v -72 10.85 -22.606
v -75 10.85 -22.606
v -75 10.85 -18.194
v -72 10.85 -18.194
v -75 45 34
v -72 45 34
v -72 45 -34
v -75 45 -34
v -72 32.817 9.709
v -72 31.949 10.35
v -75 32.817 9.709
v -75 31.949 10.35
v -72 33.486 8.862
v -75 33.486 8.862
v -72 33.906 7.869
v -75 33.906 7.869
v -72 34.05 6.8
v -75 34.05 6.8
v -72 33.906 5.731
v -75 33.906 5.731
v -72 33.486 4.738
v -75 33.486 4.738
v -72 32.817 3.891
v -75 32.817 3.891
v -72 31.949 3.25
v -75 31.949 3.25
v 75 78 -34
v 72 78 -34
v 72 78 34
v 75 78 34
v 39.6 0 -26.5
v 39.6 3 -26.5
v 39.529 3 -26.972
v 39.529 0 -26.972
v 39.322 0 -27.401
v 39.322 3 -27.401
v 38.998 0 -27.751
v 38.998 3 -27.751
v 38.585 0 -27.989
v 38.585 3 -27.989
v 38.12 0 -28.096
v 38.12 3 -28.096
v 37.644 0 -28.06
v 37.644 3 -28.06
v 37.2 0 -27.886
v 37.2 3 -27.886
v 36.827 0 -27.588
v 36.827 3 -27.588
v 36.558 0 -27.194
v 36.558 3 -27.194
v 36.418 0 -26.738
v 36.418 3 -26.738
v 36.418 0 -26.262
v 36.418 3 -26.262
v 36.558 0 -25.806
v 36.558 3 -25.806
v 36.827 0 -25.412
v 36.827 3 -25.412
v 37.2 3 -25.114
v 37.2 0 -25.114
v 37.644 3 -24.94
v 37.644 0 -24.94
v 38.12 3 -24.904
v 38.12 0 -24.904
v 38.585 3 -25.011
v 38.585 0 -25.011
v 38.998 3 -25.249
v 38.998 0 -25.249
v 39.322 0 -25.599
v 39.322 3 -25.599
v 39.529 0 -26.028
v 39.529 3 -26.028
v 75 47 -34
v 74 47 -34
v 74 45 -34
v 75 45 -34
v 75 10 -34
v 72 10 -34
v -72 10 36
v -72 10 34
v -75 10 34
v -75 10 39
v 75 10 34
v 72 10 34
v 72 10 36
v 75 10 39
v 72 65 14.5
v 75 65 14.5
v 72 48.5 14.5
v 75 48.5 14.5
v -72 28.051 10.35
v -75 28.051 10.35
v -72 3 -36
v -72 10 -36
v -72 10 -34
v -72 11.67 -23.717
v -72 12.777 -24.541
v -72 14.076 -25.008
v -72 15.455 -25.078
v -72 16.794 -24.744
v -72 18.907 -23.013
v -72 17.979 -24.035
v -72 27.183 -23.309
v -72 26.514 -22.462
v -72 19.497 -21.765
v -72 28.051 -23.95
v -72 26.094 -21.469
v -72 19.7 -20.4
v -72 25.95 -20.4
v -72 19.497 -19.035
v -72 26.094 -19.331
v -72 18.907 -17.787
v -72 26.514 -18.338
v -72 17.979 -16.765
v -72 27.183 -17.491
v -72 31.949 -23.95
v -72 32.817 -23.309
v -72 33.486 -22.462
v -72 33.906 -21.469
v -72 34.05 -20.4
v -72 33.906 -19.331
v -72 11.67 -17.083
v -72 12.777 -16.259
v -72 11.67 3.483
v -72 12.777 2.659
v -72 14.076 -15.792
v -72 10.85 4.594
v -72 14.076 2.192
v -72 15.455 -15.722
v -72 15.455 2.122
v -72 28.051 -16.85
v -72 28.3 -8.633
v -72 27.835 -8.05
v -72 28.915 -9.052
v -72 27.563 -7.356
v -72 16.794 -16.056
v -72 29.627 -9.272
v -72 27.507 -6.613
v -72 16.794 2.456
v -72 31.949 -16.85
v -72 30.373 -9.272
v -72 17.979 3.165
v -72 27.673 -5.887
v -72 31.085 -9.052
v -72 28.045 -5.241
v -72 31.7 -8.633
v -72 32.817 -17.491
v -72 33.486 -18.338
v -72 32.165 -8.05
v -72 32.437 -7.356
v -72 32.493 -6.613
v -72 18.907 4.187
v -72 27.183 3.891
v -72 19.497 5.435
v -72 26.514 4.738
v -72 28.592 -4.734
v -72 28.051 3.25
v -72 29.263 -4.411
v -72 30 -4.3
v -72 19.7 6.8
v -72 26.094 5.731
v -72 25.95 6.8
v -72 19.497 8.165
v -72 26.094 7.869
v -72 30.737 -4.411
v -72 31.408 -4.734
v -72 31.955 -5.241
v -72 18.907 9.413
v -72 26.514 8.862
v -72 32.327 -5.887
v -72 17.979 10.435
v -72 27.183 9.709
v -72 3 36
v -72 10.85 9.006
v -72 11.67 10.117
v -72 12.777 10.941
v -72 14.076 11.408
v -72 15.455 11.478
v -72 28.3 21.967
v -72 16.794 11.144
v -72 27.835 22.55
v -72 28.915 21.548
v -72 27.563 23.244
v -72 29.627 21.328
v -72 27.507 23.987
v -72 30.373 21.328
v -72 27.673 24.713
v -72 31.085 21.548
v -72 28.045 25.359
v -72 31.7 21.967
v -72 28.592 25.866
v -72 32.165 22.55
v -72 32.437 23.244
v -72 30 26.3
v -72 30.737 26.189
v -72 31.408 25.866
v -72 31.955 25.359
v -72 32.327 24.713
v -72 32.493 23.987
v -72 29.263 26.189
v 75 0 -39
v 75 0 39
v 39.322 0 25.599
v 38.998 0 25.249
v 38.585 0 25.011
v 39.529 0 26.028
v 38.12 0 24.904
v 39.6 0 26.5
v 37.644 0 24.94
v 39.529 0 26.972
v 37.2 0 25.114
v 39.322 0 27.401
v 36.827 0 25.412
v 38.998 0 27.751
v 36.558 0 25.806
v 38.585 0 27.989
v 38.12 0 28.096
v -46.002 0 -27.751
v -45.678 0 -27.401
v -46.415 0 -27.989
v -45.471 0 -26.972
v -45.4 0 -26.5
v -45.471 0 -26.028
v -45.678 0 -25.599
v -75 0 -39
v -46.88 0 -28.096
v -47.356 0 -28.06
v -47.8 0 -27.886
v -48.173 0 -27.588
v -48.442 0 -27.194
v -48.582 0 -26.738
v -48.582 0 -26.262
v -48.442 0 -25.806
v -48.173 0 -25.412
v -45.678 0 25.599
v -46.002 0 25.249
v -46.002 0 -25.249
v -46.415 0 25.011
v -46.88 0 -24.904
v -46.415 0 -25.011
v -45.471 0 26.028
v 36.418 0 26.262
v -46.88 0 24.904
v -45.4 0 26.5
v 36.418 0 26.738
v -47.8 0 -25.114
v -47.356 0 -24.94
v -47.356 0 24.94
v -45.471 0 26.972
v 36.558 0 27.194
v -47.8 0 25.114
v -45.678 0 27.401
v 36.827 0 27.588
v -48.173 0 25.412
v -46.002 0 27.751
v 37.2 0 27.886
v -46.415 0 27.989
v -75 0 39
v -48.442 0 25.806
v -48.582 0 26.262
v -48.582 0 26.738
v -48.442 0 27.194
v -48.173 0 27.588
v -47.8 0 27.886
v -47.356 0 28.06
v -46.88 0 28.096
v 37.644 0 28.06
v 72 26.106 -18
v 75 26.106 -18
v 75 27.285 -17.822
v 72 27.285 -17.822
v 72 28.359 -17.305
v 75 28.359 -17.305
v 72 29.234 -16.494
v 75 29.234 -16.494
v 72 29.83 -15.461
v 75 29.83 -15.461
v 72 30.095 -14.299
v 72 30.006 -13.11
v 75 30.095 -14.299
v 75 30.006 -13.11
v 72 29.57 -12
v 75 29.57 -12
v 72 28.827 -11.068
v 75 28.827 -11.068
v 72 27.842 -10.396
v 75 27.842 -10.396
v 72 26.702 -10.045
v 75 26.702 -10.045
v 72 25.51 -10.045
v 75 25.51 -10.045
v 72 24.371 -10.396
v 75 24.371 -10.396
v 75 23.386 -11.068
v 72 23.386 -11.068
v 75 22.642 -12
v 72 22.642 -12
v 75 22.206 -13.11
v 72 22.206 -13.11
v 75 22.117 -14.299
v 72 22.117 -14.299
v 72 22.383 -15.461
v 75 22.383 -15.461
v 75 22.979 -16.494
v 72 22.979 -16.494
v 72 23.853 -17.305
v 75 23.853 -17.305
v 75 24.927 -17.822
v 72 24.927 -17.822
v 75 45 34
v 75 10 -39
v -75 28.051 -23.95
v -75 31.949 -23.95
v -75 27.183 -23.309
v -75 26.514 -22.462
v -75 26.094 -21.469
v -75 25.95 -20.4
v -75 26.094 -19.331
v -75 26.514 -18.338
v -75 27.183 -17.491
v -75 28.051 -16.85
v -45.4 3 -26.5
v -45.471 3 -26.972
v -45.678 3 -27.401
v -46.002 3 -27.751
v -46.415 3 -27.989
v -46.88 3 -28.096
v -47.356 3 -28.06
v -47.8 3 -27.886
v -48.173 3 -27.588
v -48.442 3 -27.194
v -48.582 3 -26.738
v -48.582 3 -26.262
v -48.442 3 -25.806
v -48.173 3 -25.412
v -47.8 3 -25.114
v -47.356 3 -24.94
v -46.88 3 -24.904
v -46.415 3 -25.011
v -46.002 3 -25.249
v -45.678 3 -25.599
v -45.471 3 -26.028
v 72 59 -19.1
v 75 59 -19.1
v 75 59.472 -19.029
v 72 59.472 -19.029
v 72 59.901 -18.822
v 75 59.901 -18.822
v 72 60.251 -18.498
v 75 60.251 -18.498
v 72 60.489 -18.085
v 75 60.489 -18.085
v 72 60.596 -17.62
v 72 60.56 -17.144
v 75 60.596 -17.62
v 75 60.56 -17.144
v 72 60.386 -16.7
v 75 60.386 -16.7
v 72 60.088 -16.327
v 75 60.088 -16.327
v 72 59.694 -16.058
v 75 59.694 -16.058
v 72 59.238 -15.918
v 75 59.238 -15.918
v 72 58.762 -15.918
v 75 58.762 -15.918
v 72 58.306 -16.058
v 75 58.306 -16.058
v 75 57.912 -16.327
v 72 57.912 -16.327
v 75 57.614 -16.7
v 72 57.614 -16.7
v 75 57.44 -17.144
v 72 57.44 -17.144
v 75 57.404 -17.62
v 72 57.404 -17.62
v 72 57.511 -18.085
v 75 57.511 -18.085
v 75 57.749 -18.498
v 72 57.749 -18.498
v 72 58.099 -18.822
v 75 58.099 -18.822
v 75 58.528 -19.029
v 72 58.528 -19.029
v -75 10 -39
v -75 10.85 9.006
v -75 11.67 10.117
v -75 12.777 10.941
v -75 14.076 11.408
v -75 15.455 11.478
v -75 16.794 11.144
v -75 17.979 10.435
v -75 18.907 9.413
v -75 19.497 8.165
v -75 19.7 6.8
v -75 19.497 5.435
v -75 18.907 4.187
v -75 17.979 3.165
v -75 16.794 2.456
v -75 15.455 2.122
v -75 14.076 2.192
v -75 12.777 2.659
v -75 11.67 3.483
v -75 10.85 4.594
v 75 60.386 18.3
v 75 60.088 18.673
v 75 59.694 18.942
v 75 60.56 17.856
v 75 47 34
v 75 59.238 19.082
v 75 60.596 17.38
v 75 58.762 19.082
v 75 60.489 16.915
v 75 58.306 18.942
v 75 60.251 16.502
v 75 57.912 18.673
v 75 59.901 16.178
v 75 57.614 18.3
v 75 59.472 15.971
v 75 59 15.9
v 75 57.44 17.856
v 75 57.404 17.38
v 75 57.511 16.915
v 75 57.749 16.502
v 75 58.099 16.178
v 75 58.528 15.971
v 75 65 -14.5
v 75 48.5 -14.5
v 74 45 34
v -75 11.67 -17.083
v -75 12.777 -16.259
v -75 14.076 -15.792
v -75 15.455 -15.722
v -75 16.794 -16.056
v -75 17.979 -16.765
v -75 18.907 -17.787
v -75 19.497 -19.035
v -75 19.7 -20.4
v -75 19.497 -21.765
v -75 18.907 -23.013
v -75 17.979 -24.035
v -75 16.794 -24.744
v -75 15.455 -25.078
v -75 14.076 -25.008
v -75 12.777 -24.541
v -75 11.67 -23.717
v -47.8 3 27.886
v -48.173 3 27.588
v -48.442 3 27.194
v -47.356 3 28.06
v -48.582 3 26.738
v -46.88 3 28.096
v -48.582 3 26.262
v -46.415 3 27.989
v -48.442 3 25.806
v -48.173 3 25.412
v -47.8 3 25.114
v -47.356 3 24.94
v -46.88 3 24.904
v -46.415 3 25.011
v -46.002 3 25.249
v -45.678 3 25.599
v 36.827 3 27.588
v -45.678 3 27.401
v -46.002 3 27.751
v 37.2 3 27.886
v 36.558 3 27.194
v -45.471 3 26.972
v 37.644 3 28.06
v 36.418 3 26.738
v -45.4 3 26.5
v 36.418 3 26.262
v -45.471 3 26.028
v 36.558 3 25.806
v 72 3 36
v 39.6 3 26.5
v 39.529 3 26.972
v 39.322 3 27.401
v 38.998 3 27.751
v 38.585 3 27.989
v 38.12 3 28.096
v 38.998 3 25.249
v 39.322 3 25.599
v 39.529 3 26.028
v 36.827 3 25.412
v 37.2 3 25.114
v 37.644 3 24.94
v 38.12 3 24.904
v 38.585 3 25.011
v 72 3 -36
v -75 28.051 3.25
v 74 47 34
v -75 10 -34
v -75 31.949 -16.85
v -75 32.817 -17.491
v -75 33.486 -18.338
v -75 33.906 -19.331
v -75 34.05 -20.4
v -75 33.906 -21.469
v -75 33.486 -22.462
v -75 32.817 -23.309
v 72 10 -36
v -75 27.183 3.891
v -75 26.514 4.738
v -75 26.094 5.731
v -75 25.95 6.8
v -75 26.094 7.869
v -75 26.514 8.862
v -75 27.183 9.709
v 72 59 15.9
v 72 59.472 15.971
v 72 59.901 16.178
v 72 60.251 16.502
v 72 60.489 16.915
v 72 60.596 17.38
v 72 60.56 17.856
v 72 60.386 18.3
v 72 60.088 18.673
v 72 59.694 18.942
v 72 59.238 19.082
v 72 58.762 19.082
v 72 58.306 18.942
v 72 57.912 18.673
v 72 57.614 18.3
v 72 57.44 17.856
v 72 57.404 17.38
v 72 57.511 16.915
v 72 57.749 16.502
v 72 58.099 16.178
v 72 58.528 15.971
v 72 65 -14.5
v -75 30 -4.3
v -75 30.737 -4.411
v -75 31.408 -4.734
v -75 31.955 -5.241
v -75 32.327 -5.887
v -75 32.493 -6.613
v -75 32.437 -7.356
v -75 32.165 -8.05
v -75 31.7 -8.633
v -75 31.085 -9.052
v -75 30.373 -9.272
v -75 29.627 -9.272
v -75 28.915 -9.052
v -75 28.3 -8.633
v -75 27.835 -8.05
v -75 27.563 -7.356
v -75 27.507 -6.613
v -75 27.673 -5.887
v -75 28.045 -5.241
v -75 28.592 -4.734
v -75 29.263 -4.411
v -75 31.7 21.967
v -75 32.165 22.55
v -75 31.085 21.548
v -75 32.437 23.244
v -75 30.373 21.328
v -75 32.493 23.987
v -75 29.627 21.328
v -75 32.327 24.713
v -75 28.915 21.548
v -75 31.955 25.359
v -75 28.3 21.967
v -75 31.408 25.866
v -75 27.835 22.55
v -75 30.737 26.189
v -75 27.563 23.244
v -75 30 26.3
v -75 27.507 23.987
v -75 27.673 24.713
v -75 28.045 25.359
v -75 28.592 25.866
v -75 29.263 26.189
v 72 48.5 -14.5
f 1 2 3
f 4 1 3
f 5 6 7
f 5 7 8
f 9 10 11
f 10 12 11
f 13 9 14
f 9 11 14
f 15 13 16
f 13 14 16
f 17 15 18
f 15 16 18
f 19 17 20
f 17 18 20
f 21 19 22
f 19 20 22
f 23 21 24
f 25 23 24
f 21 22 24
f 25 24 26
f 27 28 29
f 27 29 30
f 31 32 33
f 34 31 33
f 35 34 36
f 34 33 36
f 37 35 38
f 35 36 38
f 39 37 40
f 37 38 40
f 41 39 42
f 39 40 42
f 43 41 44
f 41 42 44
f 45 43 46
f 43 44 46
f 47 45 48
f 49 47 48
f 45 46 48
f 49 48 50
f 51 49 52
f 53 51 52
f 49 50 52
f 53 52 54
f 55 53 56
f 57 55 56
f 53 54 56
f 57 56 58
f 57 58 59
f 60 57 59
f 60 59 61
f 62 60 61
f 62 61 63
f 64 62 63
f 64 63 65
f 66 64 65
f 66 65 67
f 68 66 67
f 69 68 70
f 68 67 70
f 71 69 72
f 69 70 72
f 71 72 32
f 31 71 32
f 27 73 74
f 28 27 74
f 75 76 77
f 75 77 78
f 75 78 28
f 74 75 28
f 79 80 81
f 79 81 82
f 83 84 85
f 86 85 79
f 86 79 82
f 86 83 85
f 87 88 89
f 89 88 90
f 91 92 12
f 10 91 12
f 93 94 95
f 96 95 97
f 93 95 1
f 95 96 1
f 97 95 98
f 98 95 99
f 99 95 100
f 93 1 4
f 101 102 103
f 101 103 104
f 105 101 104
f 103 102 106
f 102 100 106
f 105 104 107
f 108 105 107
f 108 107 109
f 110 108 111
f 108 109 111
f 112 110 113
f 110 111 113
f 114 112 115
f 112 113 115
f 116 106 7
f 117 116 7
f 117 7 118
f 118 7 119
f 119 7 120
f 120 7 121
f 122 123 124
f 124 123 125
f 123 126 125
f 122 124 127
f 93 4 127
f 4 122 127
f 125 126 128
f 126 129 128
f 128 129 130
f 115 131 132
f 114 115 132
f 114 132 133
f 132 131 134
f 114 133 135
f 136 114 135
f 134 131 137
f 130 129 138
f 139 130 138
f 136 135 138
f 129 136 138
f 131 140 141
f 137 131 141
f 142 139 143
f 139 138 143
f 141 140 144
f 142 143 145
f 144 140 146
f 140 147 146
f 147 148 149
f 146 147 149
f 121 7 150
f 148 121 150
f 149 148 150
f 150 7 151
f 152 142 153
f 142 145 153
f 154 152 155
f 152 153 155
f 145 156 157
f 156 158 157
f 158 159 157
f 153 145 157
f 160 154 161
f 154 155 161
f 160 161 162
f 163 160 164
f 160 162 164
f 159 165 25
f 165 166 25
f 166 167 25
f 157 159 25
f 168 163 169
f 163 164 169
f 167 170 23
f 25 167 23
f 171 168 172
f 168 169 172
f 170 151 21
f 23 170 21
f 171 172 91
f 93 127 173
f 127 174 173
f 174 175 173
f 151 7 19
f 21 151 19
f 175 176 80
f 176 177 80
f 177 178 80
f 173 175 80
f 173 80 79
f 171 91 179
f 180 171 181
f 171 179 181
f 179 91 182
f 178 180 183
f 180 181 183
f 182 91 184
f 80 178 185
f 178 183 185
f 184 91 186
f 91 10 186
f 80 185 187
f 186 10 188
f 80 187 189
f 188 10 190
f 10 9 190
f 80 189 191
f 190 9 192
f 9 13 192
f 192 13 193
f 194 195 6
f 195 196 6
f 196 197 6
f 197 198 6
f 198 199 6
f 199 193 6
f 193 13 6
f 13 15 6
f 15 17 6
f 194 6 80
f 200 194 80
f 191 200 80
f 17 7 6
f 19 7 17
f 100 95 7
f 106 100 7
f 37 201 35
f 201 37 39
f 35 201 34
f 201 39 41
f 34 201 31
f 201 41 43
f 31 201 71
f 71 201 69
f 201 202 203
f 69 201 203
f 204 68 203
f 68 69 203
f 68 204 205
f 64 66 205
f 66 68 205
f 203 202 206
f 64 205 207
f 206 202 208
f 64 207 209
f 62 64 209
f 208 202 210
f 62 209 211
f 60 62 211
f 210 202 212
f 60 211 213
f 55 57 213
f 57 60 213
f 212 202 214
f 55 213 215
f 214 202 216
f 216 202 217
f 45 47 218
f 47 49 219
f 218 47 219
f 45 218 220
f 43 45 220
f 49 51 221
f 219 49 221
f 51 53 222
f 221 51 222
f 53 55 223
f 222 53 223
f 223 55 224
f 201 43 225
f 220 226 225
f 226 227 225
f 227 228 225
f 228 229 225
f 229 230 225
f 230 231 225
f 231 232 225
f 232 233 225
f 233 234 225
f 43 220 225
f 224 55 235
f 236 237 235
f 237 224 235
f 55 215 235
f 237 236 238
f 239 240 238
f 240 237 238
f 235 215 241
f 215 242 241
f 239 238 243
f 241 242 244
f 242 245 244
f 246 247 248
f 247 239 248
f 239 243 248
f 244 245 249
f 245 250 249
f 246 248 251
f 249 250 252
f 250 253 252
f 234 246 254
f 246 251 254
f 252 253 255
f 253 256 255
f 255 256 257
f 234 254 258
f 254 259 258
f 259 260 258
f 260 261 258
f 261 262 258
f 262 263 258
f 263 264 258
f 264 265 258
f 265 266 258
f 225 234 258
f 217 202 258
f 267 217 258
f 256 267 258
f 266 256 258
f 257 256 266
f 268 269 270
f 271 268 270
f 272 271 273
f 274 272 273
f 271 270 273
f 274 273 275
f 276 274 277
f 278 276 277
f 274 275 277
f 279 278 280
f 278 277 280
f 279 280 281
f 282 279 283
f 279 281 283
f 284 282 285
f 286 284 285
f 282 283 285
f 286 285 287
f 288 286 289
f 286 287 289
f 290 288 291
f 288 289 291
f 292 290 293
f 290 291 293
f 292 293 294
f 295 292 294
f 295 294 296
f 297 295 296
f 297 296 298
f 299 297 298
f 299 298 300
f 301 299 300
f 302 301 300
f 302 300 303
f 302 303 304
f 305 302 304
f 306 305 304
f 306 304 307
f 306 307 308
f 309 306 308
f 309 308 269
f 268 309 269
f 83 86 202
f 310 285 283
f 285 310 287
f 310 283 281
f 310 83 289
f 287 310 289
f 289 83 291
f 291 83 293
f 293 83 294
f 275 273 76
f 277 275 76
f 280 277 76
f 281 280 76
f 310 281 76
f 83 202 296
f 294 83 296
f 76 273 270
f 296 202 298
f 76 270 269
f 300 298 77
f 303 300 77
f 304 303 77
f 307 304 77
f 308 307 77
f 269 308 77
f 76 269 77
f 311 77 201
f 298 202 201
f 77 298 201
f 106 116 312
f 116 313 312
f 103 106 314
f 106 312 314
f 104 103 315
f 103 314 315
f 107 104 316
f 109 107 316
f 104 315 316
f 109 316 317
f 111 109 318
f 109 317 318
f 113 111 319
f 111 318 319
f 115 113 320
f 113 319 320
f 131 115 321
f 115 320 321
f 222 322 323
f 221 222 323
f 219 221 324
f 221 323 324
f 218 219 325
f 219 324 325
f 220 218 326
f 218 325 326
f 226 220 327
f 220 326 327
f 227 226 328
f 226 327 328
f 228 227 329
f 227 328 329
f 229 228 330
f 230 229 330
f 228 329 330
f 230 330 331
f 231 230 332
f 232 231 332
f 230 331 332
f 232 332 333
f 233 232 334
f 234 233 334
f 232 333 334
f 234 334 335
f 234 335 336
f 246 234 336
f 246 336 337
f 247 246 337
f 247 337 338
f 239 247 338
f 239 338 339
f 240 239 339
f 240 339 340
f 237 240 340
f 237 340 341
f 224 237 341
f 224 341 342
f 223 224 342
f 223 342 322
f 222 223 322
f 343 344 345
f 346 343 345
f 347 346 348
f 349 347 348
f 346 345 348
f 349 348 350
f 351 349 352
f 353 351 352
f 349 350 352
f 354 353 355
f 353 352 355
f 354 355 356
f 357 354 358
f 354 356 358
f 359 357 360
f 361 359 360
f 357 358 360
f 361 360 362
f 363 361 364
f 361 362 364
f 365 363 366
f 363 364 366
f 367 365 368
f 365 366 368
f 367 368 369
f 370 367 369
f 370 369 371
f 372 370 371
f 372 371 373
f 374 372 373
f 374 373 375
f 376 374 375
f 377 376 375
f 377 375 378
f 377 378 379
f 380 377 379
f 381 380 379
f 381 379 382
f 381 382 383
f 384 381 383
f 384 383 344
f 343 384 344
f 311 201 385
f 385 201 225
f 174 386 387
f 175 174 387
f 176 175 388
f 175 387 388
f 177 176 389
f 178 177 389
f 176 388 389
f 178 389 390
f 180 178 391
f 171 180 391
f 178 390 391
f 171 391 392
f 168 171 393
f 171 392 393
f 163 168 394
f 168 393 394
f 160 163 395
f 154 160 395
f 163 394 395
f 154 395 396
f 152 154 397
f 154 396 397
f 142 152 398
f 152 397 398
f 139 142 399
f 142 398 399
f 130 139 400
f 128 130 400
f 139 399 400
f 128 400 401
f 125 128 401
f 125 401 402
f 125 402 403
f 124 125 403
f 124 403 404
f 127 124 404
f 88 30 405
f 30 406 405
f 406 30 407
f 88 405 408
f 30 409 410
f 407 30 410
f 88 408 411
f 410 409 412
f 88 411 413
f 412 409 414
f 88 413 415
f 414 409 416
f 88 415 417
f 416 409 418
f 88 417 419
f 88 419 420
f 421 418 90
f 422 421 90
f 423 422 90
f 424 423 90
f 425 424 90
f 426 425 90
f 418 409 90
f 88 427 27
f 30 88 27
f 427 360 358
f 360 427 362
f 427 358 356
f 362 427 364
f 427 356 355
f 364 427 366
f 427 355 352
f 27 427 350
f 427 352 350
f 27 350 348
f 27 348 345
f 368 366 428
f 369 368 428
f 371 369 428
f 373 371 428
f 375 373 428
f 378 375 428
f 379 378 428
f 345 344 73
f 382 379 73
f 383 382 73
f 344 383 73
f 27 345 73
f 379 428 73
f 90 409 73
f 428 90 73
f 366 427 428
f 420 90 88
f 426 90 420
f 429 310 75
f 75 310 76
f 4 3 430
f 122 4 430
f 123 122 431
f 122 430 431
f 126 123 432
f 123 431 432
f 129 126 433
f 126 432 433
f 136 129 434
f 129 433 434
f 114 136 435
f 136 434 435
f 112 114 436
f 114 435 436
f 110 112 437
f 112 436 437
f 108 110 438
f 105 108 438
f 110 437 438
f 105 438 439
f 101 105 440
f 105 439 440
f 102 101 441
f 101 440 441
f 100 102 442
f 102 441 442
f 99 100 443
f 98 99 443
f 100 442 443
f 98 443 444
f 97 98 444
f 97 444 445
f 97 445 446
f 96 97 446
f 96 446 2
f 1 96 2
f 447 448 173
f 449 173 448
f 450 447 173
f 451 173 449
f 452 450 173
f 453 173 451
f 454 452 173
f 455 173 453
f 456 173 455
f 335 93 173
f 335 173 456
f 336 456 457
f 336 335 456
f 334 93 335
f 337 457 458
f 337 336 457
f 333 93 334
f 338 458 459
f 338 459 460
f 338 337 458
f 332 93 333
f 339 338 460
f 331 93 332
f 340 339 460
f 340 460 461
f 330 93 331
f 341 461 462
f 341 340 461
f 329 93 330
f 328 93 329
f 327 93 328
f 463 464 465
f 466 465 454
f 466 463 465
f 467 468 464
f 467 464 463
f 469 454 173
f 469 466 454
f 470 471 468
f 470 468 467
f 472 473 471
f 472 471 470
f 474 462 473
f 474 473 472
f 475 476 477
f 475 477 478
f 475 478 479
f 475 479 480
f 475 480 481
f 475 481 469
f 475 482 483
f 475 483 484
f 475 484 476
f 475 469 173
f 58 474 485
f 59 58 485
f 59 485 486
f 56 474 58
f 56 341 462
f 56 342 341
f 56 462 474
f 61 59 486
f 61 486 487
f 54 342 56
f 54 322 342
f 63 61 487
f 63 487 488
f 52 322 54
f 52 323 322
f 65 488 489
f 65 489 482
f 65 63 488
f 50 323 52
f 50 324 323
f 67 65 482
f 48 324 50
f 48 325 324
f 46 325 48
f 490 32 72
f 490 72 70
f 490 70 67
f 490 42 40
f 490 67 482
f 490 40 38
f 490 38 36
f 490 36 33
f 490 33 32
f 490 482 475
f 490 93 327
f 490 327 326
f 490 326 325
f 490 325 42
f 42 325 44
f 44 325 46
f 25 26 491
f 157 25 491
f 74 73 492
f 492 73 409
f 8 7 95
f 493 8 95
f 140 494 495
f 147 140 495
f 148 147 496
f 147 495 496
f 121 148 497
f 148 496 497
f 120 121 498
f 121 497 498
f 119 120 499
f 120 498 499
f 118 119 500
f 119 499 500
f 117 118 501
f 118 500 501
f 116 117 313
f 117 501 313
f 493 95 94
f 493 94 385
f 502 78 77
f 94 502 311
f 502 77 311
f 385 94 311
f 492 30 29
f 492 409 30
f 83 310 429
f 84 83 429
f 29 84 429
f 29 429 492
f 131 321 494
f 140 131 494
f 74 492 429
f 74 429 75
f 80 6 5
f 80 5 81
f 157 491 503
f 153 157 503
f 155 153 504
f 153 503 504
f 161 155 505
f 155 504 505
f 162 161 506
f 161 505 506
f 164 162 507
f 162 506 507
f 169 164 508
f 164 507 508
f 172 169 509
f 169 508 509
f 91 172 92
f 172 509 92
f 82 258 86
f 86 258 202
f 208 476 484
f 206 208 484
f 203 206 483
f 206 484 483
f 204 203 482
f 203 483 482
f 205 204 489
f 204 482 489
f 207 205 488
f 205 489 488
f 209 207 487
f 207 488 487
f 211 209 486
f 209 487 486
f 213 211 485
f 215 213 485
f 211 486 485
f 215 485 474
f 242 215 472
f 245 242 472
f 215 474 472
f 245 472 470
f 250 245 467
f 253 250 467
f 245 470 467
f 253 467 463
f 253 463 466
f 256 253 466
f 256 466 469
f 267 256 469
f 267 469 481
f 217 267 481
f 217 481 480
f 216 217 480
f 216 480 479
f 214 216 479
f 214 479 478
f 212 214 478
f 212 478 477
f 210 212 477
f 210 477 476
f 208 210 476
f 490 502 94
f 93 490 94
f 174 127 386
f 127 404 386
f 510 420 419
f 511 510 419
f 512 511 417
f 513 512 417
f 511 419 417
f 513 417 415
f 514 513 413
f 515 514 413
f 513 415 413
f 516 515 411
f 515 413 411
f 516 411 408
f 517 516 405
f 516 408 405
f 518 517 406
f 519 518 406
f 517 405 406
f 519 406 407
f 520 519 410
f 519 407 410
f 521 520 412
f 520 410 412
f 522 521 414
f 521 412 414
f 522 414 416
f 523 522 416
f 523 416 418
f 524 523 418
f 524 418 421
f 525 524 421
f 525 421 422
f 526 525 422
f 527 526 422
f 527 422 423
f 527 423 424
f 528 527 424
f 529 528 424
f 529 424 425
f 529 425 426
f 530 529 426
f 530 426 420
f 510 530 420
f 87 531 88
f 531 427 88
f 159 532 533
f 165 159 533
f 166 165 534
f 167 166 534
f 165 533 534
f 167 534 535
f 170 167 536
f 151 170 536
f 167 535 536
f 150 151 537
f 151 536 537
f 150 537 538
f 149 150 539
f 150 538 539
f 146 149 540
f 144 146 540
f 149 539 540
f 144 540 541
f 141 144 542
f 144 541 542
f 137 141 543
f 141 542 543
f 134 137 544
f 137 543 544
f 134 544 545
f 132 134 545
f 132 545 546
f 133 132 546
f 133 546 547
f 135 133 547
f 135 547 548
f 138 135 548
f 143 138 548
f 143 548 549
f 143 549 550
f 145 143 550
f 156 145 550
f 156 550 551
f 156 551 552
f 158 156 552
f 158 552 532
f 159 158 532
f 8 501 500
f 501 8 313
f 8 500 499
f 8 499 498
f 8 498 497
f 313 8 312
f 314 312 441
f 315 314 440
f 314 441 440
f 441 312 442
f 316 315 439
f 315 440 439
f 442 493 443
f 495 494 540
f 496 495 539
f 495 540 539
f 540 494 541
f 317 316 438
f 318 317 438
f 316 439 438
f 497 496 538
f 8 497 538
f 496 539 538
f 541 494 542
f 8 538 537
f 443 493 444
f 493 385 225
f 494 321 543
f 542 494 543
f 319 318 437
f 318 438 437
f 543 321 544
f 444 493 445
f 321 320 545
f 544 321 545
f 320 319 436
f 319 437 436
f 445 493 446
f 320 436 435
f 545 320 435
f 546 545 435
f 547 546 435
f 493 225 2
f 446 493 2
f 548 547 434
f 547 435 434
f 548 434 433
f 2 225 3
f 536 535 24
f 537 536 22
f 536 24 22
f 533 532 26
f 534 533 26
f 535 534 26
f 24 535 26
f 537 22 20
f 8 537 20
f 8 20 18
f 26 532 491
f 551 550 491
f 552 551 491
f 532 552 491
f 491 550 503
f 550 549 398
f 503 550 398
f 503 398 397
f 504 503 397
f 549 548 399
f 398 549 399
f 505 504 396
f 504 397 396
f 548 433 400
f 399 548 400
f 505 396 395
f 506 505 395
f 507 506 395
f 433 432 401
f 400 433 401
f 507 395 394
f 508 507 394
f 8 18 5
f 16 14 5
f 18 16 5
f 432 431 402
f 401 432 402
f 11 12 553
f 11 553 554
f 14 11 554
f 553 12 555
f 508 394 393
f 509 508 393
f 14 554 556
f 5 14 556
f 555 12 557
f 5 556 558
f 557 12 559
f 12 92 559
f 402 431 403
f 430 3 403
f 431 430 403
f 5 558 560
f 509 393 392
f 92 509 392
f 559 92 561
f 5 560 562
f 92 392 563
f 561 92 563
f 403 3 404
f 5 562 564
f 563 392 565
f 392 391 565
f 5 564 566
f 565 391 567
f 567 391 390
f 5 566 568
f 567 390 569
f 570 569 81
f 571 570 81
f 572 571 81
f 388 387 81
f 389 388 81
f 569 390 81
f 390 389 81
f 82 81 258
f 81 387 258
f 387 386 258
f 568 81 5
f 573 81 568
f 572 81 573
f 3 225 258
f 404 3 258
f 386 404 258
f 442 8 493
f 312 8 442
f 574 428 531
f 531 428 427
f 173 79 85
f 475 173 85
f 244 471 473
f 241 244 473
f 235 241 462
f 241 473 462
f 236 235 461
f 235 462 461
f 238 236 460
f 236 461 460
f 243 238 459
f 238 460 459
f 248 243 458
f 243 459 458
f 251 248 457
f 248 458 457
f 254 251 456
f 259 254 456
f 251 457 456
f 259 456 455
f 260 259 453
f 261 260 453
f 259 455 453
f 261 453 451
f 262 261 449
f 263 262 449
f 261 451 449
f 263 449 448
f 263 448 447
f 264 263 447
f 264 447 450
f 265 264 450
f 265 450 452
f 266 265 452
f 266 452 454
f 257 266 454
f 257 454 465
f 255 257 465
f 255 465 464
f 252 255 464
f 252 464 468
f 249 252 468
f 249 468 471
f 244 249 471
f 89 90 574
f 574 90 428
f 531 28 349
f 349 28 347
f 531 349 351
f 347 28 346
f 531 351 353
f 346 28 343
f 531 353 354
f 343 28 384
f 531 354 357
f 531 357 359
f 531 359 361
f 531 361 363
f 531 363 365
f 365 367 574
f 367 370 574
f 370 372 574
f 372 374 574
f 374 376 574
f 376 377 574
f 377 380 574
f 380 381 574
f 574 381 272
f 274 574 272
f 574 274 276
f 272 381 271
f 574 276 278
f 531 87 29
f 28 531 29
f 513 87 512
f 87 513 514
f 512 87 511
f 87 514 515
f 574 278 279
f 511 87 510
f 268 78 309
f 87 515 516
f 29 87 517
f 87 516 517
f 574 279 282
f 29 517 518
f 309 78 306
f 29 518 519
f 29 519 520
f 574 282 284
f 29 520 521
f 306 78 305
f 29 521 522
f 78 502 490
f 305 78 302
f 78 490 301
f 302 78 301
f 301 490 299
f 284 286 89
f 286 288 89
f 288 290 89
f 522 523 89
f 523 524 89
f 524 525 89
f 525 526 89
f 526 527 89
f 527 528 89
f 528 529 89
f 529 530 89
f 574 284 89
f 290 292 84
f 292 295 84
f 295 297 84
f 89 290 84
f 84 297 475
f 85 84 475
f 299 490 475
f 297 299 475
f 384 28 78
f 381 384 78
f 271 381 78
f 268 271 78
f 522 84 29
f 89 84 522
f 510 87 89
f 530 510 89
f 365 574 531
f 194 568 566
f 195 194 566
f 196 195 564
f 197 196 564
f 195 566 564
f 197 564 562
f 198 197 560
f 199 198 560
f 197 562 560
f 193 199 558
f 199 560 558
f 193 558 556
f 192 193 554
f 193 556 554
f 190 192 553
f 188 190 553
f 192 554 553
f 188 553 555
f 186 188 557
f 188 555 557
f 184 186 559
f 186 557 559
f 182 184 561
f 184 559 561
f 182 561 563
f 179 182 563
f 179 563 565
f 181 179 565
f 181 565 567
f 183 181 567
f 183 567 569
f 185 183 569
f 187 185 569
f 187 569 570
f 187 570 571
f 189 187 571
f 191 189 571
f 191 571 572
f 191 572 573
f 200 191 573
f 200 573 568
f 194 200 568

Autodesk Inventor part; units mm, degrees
ref_plane "YZ Plane" through (0, 0, 0) normal (1, 0, 0) x (0, 1, 0)
ref_plane "XZ Plane" through (0, 0, 0) normal (0, 1, 0) x (-1, 0, 0)
ref_plane "XY Plane" through (0, 0, 0) normal (0, 0, 1) x (1, 0, 0)
sketch "Sketch1" plane through (0, 0, 0) normal (0, 1, 0) x (-1, 0, 0)
  line L0 (-75, -39) -> (75, -39)
  line L1 (75, -39) -> (75, 39)
  line L2 (75, 39) -> (-75, 39)
  line L3 (-75, 39) -> (-75, -39)
  line L4 (-75, -39) -> (75, 39) construction
  line L5 (75, -39) -> (-75, 39) construction
  point P0 (0, 0)
  dimension "d0" = 150
  dimension "d1" = 78
extrude "Extrusion1" add sketch "Sketch1" along normal blind 45
sketch "Sketch4" plane through (75, 0, 39) normal (1, 0, 0) x (0, 0, -1)
  line L0 (78, 45) -> (0, 45) projected
  line L1 (0, 45) -> (5, 45)
  line L2 (5, 45) -> (5, 10)
  line L3 (5, 10) -> (0, 10)
  line L4 (0, 10) -> (0, 45)
  line L5 (78, 45) -> (73, 45)
  line L6 (73, 45) -> (73, 10)
  line L7 (73, 10) -> (78, 10)
  line L8 (78, 10) -> (78, 45)
  point P0 (39, 0)
  dimension "d14" = 5
  dimension "d15" = 35
  dimension "d16" = 5
  dimension "d17" = 35
extrude "Extrusion4" cut sketch "Sketch4" against normal blind 150
sketch "Sketch5" plane through (0, 45, 0) normal (0, 1, 0) x (1, 0, 0)
  line L0 (72, 36) -> (-72, 36)
  line L1 (-72, 36) -> (-72, -36)
  line L2 (-72, -36) -> (72, -36)
  line L3 (72, -36) -> (72, 36)
  line L4 (72, 36) -> (-72, -36) construction
  line L5 (-72, 36) -> (72, -36) construction
  point P0 (0, 0)
  dimension "d20" = 144
  dimension "d21" = 72
extrude "Extrusion5" cut sketch "Sketch5" against normal blind 42
sketch "Sketch6" plane through (75, 0, 39) normal (1, 0, 0) x (0, 0, -1)
  circle A0 centre (53, 26.1062) radius 4
  line L0 (73, 10) -> (73, 45) projected
  circle A1 centre (25, 27.5) radius 10.75
  line L1 (5, 78) -> (5, 10) projected
  point P0 (39, 0)
  point P1 (5, 45)
  dimension "d25" = 8
  dimension "d33" = 20
  dimension "d67" = 21.5
  dimension "d68" = 20
sketch "Sketch7" plane through (-75, 0, -39) normal (-1, 0, 0) x (0, 0, 1)
  line L0 (22.15, 28.0506) -> (22.15, 31.9494)
  line L1 (15.05, 31.9494) -> (15.05, 28.0506)
  line L2 (15.05, 28.0506) -> (22.15, 31.9494) construction
  line L3 (22.15, 28.0506) -> (15.05, 31.9494) construction
  arc A0 (22.15, 31.9494) -> (15.05, 31.9494) centre (18.6, 30) ccw
  arc A1 (15.05, 28.0506) -> (22.15, 28.0506) centre (18.6, 30) ccw
  line L4 (18.6, 30) -> (18, 30) construction
  line L5 (0, 0) -> (78, 0) projected
  line L6 (5, 45) -> (5, 10) projected
  arc A2 (20.8062, 10.85) -> (16.3938, 10.85) centre (18.6, 15) ccw
  line L7 (16.3938, 10.85) -> (20.8062, 10.85)
  circle A3 centre (32.2, 30) radius 2.5
  line L8 (49.35, 28.0506) -> (49.35, 31.9494)
  line L9 (42.25, 31.9494) -> (42.25, 28.0506)
  line L10 (42.25, 28.0506) -> (49.35, 31.9494) construction
  line L11 (49.35, 28.0506) -> (42.25, 31.9494) construction
  arc A4 (49.35, 31.9494) -> (42.25, 31.9494) centre (45.8, 30) ccw
  arc A5 (42.25, 28.0506) -> (49.35, 28.0506) centre (45.8, 30) ccw
  line L12 (45.8, 30) -> (41.8, 30) construction
  line L13 (43.5938, 10.85) -> (48.0062, 10.85)
  arc A6 (48.0062, 10.85) -> (43.5938, 10.85) centre (45.8, 15) ccw
  circle A7 centre (62.8, 30) radius 2.5
  point P0 (39, 0)
  point P1 (18.6, 30)
  point P2 (18.6, 30)
  dimension "d36" = 7.1
  dimension "d37" = 4.05
  dimension "d77" = 30
  dimension "d81" = 13.6
  dimension "d85" = 9.4
  dimension "d86" = 4.15
  dimension "d87" = 15
  dimension "d88" = 5
  dimension "d89" = 13.6
  dimension "d90" = 7.1
  dimension "d91" = 4.05
  dimension "d92" = 9.4
  dimension "d93" = 4.15
  dimension "d94" = 15
  dimension "d95" = 5
  dimension "d96" = 17
  dimension "d97" = 13.6
sketch "Sketch8" plane through (0, 3, 0) normal (0, 1, 0) x (1, 0, 0)
  line L0 (-47, -26.5) -> (38, -26.5)
  line L1 (38, -26.5) -> (38, 26.5)
  line L2 (38, 26.5) -> (-47, 26.5)
  line L3 (-47, 26.5) -> (-47, -26.5)
  line L4 (-47, -26.5) -> (38, 26.5) construction
  line L5 (38, -26.5) -> (-47, 26.5) construction
  circle A0 centre (38, 26.5) radius 1.6
  circle A1 centre (38, -26.5) radius 1.6
  circle A2 centre (-47, -26.5) radius 1.6
  circle A3 centre (-47, 26.5) radius 1.6
  line L6 (-72, -34) -> (-72, 34) projected
  point P0 (-4.5, 0)
  dimension "d42" = 85
  dimension "d43" = 53
  dimension "d44" = 3.2
  dimension "d45" = 3.2
  dimension "d46" = 3.2
  dimension "d47" = 3.2
  dimension "d51" = 25
extrude "Extrusion8" cut sketch "Sketch8" against normal blind 3 contours L3 A2 L0 | L0 A2 L3 | A1 L1 L0 | L0 L1 A1 | A3 L2 L3 | L3 L2 A3 | A0 L2 L1 | L1 L2 A0
sketch "Sketch9" plane through (0, 45, 0) normal (0, 1, 0) x (1, 0, 0)
  line L0 (75, -34) -> (72, -34) projected
  line L1 (75, 39) -> (75, 34) projected
  line L2 (72, -34) -> (75, -34)
  line L3 (75, -34) -> (75, 34)
  line L4 (75, 34) -> (72, 34)
  line L5 (72, 34) -> (72, -34)
  point P0 (0, 0)
extrude "Extrusion9" add sketch "Sketch9" along normal blind 33
sketch "Sketch10" plane through (75, 0, 39) normal (1, 0, 0) x (0, 0, -1)
  line L0 (53.5, 65) -> (24.5, 65)
  line L1 (24.5, 65) -> (24.5, 48.5)
  line L2 (24.5, 48.5) -> (53.5, 48.5)
  line L3 (53.5, 48.5) -> (53.5, 65)
  line L4 (53.5, 65) -> (24.5, 48.5) construction
  line L5 (24.5, 65) -> (53.5, 48.5) construction
  line L6 (61.5, 65) -> (16.5, 65)
  line L7 (16.5, 65) -> (16.5, 48.5)
  line L8 (16.5, 48.5) -> (61.5, 48.5)
  line L9 (61.5, 48.5) -> (61.5, 65)
  line L10 (61.5, 65) -> (16.5, 48.5) construction
  line L11 (16.5, 65) -> (61.5, 48.5) construction
  line L12 (39, 48.5) -> (39, 65) construction
  line L13 (5, 78) -> (73, 78) projected
  line L14 (5, 78) -> (5, 10) projected
  circle A0 centre (21.5, 59) radius 1.6
  line L15 (39, 65) -> (39, 48.5)
  circle A1 centre (56.5, 59) radius 1.6
  point P0 (39, 0)
  point P1 (39, 56.75)
  point P2 (39, 56.75)
  dimension "d54" = 29
  dimension "d55" = 16.5
  dimension "d56" = 45
  dimension "d59" = 13
  dimension "d60" = 34
  dimension "d61" = 3.2
  dimension "d62" = 5
  dimension "d74" = 10.5
extrude "Extrusion10" cut sketch "Sketch10" against normal blind 3 contours L3 L2 L15 L0 | L15 L2 L1 L0 | A0 | A1
sketch "Sketch11" plane through (75, 0, 39) normal (1, 0, 0) x (0, 0, -1)
  point P0 (39, 0)
sketch "Sketch12" plane through (75, 0, 39) normal (1, 0, 0) x (0, 0, -1)
  line L0 (5, 78) -> (5, 10) projected
  line L1 (5, 45) -> (73, 45)
  line L2 (73, 45) -> (73, 47)
  line L3 (73, 47) -> (5, 47)
  line L4 (5, 47) -> (5, 45)
  line L5 (0, 0) -> (78, 0) projected
  line L6 (73, 10) -> (73, 78) projected
  point P0 (39, 0)
  dimension "d69" = 45
  dimension "d70" = 2
extrude "Extrusion12" cut sketch "Sketch12" against normal blind 1
extrude "Extrusion13" cut sketch "Sketch6" against normal blind 10 contours A0
extrude "Extrusion14" cut sketch "Sketch7" against normal blind 10
properties part number "box"
